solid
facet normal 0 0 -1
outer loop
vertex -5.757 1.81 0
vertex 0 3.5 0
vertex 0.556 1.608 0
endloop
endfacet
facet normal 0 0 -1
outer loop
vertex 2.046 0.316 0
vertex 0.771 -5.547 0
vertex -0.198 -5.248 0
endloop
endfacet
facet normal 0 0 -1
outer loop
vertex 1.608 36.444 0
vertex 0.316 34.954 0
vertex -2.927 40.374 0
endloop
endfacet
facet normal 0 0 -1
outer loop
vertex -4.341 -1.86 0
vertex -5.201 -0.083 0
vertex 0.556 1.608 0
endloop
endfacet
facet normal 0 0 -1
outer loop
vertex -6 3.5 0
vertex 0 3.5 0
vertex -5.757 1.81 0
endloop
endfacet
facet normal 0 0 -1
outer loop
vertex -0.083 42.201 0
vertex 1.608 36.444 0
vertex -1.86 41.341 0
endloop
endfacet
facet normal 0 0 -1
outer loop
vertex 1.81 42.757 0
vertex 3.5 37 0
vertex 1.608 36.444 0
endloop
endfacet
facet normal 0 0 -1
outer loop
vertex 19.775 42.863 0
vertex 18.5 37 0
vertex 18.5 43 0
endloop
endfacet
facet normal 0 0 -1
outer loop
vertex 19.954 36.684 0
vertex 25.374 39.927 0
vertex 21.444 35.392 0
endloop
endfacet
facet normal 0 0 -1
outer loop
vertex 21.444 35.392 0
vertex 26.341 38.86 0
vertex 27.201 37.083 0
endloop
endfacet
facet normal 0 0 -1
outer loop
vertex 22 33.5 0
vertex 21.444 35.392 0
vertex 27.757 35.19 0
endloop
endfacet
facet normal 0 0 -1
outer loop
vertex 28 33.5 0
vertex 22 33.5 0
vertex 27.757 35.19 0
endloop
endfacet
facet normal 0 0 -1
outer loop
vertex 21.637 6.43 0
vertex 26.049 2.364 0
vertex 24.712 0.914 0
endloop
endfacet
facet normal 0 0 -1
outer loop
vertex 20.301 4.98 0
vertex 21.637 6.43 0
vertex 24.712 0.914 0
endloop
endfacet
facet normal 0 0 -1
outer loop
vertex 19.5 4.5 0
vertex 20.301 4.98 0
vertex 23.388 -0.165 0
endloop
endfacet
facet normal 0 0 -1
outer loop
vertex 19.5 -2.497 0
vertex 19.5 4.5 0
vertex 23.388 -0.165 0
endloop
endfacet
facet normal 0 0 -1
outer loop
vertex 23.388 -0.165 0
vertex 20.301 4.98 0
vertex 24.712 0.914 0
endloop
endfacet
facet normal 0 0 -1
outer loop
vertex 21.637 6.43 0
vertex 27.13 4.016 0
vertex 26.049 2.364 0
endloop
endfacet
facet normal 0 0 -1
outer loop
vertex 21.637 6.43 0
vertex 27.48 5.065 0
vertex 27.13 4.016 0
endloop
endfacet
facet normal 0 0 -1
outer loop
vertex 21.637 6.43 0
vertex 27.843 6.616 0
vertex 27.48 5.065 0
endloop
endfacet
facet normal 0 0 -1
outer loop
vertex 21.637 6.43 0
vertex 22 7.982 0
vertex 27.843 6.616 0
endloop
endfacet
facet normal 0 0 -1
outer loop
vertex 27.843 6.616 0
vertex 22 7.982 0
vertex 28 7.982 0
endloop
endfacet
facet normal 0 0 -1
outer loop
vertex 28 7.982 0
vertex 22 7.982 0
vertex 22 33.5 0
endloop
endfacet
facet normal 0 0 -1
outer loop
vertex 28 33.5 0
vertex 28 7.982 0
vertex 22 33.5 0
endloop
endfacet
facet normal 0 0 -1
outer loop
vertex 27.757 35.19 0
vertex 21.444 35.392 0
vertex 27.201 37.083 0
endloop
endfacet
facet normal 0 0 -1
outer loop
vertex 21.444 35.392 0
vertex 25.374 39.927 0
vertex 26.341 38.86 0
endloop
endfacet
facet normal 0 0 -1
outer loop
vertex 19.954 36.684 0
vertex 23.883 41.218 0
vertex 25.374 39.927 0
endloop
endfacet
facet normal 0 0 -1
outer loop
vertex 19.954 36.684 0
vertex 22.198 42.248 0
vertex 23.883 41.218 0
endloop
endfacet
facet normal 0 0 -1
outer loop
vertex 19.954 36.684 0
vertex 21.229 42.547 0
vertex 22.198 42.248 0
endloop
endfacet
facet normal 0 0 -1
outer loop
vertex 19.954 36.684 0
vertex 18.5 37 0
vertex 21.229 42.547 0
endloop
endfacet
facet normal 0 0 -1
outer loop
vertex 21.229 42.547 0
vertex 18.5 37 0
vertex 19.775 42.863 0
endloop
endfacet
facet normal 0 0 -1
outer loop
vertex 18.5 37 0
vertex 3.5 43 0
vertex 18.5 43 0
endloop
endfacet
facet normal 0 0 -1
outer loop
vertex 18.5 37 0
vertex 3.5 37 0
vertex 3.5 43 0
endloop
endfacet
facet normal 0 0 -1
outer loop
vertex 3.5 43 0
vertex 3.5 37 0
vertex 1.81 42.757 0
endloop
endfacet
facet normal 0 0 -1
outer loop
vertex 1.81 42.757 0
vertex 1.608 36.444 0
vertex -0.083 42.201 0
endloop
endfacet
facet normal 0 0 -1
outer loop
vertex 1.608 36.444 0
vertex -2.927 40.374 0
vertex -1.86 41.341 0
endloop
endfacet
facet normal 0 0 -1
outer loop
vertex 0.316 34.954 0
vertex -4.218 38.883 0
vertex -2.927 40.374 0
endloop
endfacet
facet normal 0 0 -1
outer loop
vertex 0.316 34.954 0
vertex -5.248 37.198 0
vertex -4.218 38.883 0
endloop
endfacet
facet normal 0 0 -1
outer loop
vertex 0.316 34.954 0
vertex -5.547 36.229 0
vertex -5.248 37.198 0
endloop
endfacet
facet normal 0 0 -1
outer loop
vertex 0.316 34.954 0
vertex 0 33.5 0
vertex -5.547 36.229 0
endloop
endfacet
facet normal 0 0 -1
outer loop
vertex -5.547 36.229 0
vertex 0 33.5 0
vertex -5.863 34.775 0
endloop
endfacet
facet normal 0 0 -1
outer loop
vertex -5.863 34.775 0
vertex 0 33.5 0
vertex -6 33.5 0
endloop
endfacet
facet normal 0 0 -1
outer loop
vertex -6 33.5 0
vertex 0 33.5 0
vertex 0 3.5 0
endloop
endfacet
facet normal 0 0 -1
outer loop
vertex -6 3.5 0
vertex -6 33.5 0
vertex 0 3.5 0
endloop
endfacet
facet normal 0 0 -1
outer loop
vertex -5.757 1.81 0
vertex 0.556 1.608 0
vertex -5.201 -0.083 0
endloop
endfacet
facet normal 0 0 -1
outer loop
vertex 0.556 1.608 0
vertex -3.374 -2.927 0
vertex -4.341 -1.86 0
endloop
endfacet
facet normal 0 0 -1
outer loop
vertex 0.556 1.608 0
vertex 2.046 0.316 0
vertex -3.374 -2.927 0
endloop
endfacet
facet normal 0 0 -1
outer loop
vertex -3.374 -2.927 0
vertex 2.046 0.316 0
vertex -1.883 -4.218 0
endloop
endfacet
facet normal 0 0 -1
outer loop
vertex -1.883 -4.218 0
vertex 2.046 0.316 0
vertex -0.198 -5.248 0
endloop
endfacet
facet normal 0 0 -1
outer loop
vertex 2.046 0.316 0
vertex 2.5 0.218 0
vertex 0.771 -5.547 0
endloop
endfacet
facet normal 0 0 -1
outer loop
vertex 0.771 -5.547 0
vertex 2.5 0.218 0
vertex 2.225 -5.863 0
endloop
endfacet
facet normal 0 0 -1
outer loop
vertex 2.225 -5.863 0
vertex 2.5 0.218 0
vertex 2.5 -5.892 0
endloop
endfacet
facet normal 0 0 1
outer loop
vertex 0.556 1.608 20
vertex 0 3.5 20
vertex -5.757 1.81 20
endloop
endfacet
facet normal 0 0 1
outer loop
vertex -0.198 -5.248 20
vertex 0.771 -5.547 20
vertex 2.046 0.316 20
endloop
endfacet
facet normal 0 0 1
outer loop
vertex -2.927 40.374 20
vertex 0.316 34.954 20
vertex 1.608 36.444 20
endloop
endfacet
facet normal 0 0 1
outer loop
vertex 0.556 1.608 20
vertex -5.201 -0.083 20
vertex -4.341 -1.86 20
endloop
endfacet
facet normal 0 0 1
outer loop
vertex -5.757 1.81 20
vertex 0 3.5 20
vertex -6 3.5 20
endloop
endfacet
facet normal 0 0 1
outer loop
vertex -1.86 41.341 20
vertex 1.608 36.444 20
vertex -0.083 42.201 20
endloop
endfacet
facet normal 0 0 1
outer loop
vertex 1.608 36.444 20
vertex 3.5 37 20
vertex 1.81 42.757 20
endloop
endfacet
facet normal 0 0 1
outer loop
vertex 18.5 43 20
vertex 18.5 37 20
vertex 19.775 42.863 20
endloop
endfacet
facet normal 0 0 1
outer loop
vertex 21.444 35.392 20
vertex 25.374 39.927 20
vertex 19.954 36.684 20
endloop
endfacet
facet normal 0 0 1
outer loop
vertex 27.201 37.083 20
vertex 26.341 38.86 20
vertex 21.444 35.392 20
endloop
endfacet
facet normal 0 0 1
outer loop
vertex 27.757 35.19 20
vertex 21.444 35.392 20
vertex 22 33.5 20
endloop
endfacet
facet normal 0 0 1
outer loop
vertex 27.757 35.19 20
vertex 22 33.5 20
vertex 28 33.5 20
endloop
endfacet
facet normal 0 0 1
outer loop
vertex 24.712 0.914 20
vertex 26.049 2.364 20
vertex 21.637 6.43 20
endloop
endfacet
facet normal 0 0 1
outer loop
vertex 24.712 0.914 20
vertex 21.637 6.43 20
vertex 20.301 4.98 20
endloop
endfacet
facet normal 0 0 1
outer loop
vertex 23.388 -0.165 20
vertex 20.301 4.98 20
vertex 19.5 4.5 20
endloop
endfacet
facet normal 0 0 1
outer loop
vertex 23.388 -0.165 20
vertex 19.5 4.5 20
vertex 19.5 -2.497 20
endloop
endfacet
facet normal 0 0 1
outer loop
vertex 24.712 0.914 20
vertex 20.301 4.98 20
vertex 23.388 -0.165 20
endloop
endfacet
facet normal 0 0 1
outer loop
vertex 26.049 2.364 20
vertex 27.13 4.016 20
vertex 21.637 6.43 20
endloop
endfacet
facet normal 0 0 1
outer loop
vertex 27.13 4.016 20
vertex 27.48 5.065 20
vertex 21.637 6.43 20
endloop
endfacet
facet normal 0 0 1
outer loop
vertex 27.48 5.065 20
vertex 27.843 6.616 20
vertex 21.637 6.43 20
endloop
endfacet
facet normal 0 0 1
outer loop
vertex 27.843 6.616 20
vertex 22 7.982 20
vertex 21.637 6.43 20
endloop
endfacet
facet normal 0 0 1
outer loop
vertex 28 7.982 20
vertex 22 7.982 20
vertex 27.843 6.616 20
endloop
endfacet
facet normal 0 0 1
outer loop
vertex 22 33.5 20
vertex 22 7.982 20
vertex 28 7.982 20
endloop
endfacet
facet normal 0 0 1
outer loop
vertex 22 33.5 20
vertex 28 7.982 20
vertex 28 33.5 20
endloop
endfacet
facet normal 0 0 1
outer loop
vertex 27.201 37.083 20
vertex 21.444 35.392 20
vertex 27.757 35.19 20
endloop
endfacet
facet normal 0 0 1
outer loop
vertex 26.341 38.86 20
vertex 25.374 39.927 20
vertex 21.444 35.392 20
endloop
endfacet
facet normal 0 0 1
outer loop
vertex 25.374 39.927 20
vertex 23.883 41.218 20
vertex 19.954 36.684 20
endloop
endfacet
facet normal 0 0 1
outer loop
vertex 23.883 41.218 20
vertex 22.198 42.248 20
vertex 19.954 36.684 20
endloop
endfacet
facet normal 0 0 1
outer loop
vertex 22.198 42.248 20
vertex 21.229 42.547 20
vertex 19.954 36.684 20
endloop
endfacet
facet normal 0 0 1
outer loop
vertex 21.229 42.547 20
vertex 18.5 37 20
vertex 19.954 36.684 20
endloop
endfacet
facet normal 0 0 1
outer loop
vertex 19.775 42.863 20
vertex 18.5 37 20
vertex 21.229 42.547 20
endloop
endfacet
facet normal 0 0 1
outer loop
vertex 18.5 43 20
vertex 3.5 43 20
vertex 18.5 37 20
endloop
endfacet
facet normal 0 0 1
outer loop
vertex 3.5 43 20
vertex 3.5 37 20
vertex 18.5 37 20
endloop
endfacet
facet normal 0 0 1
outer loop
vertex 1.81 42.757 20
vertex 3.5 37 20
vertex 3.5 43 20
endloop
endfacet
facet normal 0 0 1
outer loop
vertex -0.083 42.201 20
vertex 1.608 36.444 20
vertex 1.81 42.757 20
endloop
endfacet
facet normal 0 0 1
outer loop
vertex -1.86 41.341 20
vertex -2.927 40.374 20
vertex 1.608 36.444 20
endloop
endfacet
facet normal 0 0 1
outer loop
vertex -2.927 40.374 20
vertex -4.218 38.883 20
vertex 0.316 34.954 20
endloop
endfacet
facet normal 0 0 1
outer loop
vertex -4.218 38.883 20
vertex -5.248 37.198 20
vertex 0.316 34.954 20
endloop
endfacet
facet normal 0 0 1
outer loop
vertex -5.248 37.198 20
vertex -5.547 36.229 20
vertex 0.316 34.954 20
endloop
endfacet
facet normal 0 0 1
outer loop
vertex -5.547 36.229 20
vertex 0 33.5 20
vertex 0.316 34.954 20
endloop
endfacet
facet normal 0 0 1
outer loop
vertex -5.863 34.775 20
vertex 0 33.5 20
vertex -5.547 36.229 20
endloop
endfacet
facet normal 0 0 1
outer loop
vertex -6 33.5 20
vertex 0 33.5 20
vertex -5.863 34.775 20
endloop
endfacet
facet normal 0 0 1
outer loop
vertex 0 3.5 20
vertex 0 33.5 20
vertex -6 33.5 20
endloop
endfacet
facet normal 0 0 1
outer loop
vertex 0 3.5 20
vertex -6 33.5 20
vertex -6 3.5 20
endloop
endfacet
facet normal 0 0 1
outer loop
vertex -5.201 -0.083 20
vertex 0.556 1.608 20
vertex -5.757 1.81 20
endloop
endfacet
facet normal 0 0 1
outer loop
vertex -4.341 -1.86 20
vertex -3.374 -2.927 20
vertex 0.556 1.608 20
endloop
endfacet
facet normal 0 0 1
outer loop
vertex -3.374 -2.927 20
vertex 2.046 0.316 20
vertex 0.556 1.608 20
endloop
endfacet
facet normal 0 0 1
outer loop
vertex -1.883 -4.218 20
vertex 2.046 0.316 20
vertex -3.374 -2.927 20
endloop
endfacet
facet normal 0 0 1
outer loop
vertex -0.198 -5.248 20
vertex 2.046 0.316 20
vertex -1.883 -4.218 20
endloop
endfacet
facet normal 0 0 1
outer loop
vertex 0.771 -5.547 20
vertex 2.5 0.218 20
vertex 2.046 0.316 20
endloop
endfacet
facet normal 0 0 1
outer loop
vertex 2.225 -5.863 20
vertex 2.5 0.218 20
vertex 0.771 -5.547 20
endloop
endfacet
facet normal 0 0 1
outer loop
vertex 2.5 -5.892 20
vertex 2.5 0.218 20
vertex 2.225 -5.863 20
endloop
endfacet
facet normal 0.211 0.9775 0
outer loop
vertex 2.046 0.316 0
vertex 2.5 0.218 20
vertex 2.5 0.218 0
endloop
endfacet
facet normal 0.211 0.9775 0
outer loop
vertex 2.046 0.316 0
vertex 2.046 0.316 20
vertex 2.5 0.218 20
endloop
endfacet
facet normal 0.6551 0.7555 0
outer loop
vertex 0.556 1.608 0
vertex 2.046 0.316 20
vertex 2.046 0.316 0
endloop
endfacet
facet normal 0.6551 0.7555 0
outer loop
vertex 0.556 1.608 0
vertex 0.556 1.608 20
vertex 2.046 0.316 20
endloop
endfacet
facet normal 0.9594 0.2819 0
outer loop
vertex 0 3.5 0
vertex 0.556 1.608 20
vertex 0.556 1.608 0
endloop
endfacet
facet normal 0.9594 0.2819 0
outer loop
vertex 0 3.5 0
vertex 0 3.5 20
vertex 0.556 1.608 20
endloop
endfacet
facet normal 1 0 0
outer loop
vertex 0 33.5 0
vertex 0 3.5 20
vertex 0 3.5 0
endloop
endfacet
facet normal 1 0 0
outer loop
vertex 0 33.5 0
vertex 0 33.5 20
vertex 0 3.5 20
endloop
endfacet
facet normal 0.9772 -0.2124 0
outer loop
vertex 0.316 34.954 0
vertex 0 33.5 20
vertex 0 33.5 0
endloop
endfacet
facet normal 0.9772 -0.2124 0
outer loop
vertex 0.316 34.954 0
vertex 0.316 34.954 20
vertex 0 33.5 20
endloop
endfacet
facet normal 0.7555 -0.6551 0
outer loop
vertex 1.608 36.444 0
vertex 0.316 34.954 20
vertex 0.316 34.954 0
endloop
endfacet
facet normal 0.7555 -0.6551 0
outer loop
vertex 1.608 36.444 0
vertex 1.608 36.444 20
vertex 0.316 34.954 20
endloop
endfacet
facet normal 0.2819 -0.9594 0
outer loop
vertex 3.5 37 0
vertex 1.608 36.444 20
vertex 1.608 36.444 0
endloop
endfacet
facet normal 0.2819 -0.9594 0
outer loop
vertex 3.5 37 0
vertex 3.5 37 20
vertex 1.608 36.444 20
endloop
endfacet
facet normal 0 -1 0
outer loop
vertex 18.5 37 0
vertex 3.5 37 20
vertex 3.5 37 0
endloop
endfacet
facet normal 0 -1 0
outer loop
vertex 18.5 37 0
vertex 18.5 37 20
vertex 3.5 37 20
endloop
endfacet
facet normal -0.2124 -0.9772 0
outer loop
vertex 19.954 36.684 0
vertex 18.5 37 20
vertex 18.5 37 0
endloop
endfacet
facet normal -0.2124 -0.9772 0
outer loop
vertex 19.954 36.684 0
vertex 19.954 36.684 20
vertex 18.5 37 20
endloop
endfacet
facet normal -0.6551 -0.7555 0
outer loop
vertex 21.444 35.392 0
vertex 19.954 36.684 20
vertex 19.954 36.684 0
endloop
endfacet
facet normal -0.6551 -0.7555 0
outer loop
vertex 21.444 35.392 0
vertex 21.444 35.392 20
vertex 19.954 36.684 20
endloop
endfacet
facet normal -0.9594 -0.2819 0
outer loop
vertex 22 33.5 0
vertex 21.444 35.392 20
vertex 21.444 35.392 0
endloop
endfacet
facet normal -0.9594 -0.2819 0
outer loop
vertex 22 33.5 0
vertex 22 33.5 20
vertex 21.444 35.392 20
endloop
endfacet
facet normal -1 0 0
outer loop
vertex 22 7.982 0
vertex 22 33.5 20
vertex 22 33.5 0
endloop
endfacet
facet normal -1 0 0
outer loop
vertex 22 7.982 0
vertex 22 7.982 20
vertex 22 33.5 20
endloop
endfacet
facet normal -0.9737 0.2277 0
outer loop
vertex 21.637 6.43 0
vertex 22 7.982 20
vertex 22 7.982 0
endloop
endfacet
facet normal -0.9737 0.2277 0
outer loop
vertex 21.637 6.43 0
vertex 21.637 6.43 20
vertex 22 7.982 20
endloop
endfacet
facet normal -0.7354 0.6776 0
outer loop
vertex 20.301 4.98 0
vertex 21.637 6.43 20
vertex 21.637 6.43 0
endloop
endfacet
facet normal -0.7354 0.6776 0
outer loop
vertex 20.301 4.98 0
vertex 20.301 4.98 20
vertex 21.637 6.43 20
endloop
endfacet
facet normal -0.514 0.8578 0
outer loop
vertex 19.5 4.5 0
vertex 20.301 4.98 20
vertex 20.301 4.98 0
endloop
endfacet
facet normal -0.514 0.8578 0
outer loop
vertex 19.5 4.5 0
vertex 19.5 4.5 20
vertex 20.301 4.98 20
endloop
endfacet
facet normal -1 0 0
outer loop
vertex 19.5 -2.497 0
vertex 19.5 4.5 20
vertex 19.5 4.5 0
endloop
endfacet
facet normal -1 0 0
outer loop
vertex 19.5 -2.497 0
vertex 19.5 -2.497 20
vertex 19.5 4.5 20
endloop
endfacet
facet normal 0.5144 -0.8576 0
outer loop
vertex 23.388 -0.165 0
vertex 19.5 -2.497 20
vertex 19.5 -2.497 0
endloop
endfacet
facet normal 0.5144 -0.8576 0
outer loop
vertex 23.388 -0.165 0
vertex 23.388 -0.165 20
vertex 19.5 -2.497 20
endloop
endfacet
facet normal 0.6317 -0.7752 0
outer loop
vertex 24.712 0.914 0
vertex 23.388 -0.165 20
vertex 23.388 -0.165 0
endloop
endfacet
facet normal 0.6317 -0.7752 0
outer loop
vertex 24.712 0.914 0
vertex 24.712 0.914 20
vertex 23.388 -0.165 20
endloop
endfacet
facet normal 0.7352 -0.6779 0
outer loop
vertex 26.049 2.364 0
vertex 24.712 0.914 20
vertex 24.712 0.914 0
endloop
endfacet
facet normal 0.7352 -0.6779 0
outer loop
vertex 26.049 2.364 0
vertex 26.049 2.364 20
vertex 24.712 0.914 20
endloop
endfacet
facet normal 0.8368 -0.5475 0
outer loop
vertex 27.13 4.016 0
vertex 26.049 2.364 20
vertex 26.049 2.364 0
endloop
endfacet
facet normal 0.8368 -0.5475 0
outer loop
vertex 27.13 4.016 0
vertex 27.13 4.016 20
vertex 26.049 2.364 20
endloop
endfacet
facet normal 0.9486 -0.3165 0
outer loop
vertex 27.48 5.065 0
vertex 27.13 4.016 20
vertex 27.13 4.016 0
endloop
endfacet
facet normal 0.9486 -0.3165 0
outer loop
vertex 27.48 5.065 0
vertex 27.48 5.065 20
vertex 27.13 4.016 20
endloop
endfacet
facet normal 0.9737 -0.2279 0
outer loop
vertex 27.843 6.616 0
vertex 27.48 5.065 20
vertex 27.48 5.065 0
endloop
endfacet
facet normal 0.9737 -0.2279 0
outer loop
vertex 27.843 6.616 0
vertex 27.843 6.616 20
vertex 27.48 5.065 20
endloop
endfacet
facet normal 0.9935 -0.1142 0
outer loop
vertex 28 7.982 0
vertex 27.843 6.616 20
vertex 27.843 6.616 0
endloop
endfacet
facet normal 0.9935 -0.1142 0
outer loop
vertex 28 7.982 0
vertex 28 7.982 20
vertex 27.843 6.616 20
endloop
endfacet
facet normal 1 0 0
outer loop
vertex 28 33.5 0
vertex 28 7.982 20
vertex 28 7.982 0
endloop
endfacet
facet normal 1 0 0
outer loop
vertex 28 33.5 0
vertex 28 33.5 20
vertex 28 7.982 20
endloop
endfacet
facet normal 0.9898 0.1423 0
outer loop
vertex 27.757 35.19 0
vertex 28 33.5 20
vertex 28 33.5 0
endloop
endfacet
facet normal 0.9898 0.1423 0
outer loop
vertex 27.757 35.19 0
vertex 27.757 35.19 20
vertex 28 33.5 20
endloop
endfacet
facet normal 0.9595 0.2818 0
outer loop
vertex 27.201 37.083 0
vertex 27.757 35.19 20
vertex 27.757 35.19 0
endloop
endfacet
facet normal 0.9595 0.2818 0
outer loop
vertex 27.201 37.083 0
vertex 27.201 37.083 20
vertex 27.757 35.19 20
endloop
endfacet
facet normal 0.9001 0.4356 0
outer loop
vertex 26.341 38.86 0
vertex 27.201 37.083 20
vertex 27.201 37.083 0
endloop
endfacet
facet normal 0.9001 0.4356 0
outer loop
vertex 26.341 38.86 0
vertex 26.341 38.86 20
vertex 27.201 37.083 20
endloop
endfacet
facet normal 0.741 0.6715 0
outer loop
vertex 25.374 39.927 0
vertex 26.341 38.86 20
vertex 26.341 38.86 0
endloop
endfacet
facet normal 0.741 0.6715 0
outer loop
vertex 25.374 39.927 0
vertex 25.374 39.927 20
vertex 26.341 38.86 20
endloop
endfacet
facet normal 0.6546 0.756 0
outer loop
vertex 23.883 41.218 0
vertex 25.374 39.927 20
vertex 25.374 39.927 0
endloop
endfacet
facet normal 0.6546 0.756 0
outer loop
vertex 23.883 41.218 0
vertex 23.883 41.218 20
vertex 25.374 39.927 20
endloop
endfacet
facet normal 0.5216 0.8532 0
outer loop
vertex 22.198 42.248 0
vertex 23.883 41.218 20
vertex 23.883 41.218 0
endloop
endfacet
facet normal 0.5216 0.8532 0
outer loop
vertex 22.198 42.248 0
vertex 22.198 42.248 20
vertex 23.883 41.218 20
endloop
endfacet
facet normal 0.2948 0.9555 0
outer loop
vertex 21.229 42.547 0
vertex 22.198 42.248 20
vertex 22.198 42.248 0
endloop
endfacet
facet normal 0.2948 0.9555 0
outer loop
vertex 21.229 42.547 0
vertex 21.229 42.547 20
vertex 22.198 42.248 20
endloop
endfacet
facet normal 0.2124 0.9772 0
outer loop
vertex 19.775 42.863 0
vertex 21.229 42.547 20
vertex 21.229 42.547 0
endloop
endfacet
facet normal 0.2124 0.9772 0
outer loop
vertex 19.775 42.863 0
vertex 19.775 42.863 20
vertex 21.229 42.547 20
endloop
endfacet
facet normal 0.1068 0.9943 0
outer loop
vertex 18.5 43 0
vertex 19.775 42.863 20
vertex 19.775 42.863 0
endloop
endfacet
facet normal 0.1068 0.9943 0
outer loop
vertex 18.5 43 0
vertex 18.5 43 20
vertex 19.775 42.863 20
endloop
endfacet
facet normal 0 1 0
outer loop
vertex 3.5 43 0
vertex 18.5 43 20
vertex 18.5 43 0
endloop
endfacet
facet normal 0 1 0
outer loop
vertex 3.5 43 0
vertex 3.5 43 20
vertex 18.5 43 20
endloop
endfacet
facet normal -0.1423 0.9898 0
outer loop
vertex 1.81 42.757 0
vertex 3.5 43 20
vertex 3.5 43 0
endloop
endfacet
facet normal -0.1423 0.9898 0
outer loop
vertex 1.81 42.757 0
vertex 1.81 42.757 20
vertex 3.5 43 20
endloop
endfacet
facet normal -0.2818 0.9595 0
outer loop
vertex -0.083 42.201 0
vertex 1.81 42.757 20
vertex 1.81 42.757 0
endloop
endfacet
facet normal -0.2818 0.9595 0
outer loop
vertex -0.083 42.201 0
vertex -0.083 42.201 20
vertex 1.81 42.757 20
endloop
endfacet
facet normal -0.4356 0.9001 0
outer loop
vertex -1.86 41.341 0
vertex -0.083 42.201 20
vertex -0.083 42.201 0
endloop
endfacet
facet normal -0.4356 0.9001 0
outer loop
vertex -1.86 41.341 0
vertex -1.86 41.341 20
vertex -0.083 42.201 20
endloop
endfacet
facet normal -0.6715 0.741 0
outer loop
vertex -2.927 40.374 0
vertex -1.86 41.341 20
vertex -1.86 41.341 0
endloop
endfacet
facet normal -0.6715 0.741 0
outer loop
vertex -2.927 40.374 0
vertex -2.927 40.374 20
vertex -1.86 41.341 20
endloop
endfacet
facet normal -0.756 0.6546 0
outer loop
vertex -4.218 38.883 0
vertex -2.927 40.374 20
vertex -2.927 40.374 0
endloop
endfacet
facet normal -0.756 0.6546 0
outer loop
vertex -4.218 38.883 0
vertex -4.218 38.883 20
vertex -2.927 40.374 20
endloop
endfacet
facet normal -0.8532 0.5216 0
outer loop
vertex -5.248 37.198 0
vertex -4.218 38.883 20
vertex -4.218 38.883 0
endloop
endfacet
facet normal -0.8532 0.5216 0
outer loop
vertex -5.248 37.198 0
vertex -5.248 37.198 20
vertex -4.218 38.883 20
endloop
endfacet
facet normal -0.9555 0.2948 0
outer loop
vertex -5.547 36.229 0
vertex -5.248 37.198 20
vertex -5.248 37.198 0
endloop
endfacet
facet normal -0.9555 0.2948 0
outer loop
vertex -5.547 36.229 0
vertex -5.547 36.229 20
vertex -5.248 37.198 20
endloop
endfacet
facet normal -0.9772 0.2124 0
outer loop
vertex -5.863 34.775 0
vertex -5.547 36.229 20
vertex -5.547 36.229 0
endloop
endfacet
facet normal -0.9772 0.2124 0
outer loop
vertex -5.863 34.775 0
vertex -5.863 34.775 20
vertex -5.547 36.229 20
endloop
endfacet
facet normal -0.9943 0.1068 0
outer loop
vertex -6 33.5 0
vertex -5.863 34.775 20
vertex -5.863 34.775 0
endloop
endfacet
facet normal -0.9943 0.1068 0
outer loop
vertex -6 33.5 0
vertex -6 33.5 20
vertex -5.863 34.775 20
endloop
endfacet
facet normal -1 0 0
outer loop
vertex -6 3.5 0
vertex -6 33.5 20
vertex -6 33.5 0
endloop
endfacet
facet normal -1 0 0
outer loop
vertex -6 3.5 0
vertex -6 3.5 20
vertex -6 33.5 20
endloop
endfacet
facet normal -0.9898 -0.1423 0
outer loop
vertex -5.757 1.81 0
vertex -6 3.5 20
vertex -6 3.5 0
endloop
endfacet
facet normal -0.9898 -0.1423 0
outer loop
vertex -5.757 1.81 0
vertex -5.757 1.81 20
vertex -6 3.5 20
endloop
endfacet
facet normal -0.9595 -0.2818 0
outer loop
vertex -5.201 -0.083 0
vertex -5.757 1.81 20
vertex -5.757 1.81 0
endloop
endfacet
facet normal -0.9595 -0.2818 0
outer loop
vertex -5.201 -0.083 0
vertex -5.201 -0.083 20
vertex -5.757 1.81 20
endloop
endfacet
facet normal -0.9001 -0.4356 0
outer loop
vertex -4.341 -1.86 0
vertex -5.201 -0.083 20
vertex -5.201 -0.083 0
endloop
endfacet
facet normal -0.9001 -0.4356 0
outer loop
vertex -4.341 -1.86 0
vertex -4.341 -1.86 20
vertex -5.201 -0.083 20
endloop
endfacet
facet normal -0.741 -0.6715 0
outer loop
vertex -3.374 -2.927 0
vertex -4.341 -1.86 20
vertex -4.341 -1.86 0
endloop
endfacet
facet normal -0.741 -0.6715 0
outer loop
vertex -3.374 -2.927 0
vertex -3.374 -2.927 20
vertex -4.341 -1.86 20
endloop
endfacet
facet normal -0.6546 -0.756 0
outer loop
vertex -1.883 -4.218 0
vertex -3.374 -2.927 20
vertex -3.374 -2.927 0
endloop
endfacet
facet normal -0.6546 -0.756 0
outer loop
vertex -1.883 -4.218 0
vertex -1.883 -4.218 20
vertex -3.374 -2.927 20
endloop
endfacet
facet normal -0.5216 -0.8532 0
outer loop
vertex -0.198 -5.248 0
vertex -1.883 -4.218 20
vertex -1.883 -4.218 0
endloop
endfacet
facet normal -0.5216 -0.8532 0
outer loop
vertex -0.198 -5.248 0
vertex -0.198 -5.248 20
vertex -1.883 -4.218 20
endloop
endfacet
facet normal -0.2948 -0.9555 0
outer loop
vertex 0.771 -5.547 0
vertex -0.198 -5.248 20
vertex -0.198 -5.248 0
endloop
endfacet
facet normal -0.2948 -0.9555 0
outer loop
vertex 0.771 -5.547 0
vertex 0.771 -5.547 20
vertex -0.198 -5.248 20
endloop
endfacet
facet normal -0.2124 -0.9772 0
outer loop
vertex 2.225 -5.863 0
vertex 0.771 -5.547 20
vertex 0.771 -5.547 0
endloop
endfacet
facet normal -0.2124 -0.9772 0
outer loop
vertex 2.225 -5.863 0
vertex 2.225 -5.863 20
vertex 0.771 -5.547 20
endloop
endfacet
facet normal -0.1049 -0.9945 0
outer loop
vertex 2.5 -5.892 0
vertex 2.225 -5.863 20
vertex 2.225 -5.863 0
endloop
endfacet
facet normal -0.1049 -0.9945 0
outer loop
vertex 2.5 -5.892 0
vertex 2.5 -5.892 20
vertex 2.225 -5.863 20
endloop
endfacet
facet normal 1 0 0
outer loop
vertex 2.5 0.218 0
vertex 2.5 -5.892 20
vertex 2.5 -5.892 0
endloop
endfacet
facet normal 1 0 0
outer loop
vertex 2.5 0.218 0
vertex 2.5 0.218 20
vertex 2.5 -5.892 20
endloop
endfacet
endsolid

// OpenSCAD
/*

 ______________
|  _________   |
| |         |  |
| |         |  |
| |         |  |
| |         |  |
| |         |  |
| |         |  |
| |         |  |
| |        /  /
| |__    /  /
|____|  |_/

*/

x_max_small = 21;
y_max_small = 36;
x_2_small = 12;
y_2_small = 6;

x_max_big = 23.5;
y_max_big = 40.5;
x_2_big = 14;
y_2_big = 6.5;

tol = 1;

x_hold = 2.5;

length = 20;

r = 3.5;
t = 6;

linear_extrude(height=length)
  clamp_2d_small();

module clamp_2d_small() {
  clamp_2d(
    x_max=x_max_small + tol,
    y_max=y_max_small + tol,
    x_2=x_2_small,
    y_2=y_2_small,
    x_hold=x_hold,
    t=t,
    r=r
  );
}

module clamp_2d(x_max, y_max, x_2, y_2, x_hold, t, r) {
  difference() {
    offset(t)
      clamp_2d_raw(x_max=x_max, y_max=y_max, x_2=x_2, y_2=y_2, x_hold=x_hold, r=r);
    clamp_2d_raw(x_max=x_max, y_max=y_max, x_2=x_2, y_2=y_2, x_hold=x_hold, r=r);

    translate([(x_hold), -.5 * y_max])
      #square([x_max - 2 * x_hold, y_max]);
  }
}

module clamp_2d_raw(x_max, y_max, x_2, y_2, x_hold, r) {
  offset(r)
    offset(-r)
      polygon(
        points=[
          [0, 0],
          [0, y_max],
          [x_max, y_max],
          [x_max, y_2],
          [x_2, 0],
        ]
      );
}
